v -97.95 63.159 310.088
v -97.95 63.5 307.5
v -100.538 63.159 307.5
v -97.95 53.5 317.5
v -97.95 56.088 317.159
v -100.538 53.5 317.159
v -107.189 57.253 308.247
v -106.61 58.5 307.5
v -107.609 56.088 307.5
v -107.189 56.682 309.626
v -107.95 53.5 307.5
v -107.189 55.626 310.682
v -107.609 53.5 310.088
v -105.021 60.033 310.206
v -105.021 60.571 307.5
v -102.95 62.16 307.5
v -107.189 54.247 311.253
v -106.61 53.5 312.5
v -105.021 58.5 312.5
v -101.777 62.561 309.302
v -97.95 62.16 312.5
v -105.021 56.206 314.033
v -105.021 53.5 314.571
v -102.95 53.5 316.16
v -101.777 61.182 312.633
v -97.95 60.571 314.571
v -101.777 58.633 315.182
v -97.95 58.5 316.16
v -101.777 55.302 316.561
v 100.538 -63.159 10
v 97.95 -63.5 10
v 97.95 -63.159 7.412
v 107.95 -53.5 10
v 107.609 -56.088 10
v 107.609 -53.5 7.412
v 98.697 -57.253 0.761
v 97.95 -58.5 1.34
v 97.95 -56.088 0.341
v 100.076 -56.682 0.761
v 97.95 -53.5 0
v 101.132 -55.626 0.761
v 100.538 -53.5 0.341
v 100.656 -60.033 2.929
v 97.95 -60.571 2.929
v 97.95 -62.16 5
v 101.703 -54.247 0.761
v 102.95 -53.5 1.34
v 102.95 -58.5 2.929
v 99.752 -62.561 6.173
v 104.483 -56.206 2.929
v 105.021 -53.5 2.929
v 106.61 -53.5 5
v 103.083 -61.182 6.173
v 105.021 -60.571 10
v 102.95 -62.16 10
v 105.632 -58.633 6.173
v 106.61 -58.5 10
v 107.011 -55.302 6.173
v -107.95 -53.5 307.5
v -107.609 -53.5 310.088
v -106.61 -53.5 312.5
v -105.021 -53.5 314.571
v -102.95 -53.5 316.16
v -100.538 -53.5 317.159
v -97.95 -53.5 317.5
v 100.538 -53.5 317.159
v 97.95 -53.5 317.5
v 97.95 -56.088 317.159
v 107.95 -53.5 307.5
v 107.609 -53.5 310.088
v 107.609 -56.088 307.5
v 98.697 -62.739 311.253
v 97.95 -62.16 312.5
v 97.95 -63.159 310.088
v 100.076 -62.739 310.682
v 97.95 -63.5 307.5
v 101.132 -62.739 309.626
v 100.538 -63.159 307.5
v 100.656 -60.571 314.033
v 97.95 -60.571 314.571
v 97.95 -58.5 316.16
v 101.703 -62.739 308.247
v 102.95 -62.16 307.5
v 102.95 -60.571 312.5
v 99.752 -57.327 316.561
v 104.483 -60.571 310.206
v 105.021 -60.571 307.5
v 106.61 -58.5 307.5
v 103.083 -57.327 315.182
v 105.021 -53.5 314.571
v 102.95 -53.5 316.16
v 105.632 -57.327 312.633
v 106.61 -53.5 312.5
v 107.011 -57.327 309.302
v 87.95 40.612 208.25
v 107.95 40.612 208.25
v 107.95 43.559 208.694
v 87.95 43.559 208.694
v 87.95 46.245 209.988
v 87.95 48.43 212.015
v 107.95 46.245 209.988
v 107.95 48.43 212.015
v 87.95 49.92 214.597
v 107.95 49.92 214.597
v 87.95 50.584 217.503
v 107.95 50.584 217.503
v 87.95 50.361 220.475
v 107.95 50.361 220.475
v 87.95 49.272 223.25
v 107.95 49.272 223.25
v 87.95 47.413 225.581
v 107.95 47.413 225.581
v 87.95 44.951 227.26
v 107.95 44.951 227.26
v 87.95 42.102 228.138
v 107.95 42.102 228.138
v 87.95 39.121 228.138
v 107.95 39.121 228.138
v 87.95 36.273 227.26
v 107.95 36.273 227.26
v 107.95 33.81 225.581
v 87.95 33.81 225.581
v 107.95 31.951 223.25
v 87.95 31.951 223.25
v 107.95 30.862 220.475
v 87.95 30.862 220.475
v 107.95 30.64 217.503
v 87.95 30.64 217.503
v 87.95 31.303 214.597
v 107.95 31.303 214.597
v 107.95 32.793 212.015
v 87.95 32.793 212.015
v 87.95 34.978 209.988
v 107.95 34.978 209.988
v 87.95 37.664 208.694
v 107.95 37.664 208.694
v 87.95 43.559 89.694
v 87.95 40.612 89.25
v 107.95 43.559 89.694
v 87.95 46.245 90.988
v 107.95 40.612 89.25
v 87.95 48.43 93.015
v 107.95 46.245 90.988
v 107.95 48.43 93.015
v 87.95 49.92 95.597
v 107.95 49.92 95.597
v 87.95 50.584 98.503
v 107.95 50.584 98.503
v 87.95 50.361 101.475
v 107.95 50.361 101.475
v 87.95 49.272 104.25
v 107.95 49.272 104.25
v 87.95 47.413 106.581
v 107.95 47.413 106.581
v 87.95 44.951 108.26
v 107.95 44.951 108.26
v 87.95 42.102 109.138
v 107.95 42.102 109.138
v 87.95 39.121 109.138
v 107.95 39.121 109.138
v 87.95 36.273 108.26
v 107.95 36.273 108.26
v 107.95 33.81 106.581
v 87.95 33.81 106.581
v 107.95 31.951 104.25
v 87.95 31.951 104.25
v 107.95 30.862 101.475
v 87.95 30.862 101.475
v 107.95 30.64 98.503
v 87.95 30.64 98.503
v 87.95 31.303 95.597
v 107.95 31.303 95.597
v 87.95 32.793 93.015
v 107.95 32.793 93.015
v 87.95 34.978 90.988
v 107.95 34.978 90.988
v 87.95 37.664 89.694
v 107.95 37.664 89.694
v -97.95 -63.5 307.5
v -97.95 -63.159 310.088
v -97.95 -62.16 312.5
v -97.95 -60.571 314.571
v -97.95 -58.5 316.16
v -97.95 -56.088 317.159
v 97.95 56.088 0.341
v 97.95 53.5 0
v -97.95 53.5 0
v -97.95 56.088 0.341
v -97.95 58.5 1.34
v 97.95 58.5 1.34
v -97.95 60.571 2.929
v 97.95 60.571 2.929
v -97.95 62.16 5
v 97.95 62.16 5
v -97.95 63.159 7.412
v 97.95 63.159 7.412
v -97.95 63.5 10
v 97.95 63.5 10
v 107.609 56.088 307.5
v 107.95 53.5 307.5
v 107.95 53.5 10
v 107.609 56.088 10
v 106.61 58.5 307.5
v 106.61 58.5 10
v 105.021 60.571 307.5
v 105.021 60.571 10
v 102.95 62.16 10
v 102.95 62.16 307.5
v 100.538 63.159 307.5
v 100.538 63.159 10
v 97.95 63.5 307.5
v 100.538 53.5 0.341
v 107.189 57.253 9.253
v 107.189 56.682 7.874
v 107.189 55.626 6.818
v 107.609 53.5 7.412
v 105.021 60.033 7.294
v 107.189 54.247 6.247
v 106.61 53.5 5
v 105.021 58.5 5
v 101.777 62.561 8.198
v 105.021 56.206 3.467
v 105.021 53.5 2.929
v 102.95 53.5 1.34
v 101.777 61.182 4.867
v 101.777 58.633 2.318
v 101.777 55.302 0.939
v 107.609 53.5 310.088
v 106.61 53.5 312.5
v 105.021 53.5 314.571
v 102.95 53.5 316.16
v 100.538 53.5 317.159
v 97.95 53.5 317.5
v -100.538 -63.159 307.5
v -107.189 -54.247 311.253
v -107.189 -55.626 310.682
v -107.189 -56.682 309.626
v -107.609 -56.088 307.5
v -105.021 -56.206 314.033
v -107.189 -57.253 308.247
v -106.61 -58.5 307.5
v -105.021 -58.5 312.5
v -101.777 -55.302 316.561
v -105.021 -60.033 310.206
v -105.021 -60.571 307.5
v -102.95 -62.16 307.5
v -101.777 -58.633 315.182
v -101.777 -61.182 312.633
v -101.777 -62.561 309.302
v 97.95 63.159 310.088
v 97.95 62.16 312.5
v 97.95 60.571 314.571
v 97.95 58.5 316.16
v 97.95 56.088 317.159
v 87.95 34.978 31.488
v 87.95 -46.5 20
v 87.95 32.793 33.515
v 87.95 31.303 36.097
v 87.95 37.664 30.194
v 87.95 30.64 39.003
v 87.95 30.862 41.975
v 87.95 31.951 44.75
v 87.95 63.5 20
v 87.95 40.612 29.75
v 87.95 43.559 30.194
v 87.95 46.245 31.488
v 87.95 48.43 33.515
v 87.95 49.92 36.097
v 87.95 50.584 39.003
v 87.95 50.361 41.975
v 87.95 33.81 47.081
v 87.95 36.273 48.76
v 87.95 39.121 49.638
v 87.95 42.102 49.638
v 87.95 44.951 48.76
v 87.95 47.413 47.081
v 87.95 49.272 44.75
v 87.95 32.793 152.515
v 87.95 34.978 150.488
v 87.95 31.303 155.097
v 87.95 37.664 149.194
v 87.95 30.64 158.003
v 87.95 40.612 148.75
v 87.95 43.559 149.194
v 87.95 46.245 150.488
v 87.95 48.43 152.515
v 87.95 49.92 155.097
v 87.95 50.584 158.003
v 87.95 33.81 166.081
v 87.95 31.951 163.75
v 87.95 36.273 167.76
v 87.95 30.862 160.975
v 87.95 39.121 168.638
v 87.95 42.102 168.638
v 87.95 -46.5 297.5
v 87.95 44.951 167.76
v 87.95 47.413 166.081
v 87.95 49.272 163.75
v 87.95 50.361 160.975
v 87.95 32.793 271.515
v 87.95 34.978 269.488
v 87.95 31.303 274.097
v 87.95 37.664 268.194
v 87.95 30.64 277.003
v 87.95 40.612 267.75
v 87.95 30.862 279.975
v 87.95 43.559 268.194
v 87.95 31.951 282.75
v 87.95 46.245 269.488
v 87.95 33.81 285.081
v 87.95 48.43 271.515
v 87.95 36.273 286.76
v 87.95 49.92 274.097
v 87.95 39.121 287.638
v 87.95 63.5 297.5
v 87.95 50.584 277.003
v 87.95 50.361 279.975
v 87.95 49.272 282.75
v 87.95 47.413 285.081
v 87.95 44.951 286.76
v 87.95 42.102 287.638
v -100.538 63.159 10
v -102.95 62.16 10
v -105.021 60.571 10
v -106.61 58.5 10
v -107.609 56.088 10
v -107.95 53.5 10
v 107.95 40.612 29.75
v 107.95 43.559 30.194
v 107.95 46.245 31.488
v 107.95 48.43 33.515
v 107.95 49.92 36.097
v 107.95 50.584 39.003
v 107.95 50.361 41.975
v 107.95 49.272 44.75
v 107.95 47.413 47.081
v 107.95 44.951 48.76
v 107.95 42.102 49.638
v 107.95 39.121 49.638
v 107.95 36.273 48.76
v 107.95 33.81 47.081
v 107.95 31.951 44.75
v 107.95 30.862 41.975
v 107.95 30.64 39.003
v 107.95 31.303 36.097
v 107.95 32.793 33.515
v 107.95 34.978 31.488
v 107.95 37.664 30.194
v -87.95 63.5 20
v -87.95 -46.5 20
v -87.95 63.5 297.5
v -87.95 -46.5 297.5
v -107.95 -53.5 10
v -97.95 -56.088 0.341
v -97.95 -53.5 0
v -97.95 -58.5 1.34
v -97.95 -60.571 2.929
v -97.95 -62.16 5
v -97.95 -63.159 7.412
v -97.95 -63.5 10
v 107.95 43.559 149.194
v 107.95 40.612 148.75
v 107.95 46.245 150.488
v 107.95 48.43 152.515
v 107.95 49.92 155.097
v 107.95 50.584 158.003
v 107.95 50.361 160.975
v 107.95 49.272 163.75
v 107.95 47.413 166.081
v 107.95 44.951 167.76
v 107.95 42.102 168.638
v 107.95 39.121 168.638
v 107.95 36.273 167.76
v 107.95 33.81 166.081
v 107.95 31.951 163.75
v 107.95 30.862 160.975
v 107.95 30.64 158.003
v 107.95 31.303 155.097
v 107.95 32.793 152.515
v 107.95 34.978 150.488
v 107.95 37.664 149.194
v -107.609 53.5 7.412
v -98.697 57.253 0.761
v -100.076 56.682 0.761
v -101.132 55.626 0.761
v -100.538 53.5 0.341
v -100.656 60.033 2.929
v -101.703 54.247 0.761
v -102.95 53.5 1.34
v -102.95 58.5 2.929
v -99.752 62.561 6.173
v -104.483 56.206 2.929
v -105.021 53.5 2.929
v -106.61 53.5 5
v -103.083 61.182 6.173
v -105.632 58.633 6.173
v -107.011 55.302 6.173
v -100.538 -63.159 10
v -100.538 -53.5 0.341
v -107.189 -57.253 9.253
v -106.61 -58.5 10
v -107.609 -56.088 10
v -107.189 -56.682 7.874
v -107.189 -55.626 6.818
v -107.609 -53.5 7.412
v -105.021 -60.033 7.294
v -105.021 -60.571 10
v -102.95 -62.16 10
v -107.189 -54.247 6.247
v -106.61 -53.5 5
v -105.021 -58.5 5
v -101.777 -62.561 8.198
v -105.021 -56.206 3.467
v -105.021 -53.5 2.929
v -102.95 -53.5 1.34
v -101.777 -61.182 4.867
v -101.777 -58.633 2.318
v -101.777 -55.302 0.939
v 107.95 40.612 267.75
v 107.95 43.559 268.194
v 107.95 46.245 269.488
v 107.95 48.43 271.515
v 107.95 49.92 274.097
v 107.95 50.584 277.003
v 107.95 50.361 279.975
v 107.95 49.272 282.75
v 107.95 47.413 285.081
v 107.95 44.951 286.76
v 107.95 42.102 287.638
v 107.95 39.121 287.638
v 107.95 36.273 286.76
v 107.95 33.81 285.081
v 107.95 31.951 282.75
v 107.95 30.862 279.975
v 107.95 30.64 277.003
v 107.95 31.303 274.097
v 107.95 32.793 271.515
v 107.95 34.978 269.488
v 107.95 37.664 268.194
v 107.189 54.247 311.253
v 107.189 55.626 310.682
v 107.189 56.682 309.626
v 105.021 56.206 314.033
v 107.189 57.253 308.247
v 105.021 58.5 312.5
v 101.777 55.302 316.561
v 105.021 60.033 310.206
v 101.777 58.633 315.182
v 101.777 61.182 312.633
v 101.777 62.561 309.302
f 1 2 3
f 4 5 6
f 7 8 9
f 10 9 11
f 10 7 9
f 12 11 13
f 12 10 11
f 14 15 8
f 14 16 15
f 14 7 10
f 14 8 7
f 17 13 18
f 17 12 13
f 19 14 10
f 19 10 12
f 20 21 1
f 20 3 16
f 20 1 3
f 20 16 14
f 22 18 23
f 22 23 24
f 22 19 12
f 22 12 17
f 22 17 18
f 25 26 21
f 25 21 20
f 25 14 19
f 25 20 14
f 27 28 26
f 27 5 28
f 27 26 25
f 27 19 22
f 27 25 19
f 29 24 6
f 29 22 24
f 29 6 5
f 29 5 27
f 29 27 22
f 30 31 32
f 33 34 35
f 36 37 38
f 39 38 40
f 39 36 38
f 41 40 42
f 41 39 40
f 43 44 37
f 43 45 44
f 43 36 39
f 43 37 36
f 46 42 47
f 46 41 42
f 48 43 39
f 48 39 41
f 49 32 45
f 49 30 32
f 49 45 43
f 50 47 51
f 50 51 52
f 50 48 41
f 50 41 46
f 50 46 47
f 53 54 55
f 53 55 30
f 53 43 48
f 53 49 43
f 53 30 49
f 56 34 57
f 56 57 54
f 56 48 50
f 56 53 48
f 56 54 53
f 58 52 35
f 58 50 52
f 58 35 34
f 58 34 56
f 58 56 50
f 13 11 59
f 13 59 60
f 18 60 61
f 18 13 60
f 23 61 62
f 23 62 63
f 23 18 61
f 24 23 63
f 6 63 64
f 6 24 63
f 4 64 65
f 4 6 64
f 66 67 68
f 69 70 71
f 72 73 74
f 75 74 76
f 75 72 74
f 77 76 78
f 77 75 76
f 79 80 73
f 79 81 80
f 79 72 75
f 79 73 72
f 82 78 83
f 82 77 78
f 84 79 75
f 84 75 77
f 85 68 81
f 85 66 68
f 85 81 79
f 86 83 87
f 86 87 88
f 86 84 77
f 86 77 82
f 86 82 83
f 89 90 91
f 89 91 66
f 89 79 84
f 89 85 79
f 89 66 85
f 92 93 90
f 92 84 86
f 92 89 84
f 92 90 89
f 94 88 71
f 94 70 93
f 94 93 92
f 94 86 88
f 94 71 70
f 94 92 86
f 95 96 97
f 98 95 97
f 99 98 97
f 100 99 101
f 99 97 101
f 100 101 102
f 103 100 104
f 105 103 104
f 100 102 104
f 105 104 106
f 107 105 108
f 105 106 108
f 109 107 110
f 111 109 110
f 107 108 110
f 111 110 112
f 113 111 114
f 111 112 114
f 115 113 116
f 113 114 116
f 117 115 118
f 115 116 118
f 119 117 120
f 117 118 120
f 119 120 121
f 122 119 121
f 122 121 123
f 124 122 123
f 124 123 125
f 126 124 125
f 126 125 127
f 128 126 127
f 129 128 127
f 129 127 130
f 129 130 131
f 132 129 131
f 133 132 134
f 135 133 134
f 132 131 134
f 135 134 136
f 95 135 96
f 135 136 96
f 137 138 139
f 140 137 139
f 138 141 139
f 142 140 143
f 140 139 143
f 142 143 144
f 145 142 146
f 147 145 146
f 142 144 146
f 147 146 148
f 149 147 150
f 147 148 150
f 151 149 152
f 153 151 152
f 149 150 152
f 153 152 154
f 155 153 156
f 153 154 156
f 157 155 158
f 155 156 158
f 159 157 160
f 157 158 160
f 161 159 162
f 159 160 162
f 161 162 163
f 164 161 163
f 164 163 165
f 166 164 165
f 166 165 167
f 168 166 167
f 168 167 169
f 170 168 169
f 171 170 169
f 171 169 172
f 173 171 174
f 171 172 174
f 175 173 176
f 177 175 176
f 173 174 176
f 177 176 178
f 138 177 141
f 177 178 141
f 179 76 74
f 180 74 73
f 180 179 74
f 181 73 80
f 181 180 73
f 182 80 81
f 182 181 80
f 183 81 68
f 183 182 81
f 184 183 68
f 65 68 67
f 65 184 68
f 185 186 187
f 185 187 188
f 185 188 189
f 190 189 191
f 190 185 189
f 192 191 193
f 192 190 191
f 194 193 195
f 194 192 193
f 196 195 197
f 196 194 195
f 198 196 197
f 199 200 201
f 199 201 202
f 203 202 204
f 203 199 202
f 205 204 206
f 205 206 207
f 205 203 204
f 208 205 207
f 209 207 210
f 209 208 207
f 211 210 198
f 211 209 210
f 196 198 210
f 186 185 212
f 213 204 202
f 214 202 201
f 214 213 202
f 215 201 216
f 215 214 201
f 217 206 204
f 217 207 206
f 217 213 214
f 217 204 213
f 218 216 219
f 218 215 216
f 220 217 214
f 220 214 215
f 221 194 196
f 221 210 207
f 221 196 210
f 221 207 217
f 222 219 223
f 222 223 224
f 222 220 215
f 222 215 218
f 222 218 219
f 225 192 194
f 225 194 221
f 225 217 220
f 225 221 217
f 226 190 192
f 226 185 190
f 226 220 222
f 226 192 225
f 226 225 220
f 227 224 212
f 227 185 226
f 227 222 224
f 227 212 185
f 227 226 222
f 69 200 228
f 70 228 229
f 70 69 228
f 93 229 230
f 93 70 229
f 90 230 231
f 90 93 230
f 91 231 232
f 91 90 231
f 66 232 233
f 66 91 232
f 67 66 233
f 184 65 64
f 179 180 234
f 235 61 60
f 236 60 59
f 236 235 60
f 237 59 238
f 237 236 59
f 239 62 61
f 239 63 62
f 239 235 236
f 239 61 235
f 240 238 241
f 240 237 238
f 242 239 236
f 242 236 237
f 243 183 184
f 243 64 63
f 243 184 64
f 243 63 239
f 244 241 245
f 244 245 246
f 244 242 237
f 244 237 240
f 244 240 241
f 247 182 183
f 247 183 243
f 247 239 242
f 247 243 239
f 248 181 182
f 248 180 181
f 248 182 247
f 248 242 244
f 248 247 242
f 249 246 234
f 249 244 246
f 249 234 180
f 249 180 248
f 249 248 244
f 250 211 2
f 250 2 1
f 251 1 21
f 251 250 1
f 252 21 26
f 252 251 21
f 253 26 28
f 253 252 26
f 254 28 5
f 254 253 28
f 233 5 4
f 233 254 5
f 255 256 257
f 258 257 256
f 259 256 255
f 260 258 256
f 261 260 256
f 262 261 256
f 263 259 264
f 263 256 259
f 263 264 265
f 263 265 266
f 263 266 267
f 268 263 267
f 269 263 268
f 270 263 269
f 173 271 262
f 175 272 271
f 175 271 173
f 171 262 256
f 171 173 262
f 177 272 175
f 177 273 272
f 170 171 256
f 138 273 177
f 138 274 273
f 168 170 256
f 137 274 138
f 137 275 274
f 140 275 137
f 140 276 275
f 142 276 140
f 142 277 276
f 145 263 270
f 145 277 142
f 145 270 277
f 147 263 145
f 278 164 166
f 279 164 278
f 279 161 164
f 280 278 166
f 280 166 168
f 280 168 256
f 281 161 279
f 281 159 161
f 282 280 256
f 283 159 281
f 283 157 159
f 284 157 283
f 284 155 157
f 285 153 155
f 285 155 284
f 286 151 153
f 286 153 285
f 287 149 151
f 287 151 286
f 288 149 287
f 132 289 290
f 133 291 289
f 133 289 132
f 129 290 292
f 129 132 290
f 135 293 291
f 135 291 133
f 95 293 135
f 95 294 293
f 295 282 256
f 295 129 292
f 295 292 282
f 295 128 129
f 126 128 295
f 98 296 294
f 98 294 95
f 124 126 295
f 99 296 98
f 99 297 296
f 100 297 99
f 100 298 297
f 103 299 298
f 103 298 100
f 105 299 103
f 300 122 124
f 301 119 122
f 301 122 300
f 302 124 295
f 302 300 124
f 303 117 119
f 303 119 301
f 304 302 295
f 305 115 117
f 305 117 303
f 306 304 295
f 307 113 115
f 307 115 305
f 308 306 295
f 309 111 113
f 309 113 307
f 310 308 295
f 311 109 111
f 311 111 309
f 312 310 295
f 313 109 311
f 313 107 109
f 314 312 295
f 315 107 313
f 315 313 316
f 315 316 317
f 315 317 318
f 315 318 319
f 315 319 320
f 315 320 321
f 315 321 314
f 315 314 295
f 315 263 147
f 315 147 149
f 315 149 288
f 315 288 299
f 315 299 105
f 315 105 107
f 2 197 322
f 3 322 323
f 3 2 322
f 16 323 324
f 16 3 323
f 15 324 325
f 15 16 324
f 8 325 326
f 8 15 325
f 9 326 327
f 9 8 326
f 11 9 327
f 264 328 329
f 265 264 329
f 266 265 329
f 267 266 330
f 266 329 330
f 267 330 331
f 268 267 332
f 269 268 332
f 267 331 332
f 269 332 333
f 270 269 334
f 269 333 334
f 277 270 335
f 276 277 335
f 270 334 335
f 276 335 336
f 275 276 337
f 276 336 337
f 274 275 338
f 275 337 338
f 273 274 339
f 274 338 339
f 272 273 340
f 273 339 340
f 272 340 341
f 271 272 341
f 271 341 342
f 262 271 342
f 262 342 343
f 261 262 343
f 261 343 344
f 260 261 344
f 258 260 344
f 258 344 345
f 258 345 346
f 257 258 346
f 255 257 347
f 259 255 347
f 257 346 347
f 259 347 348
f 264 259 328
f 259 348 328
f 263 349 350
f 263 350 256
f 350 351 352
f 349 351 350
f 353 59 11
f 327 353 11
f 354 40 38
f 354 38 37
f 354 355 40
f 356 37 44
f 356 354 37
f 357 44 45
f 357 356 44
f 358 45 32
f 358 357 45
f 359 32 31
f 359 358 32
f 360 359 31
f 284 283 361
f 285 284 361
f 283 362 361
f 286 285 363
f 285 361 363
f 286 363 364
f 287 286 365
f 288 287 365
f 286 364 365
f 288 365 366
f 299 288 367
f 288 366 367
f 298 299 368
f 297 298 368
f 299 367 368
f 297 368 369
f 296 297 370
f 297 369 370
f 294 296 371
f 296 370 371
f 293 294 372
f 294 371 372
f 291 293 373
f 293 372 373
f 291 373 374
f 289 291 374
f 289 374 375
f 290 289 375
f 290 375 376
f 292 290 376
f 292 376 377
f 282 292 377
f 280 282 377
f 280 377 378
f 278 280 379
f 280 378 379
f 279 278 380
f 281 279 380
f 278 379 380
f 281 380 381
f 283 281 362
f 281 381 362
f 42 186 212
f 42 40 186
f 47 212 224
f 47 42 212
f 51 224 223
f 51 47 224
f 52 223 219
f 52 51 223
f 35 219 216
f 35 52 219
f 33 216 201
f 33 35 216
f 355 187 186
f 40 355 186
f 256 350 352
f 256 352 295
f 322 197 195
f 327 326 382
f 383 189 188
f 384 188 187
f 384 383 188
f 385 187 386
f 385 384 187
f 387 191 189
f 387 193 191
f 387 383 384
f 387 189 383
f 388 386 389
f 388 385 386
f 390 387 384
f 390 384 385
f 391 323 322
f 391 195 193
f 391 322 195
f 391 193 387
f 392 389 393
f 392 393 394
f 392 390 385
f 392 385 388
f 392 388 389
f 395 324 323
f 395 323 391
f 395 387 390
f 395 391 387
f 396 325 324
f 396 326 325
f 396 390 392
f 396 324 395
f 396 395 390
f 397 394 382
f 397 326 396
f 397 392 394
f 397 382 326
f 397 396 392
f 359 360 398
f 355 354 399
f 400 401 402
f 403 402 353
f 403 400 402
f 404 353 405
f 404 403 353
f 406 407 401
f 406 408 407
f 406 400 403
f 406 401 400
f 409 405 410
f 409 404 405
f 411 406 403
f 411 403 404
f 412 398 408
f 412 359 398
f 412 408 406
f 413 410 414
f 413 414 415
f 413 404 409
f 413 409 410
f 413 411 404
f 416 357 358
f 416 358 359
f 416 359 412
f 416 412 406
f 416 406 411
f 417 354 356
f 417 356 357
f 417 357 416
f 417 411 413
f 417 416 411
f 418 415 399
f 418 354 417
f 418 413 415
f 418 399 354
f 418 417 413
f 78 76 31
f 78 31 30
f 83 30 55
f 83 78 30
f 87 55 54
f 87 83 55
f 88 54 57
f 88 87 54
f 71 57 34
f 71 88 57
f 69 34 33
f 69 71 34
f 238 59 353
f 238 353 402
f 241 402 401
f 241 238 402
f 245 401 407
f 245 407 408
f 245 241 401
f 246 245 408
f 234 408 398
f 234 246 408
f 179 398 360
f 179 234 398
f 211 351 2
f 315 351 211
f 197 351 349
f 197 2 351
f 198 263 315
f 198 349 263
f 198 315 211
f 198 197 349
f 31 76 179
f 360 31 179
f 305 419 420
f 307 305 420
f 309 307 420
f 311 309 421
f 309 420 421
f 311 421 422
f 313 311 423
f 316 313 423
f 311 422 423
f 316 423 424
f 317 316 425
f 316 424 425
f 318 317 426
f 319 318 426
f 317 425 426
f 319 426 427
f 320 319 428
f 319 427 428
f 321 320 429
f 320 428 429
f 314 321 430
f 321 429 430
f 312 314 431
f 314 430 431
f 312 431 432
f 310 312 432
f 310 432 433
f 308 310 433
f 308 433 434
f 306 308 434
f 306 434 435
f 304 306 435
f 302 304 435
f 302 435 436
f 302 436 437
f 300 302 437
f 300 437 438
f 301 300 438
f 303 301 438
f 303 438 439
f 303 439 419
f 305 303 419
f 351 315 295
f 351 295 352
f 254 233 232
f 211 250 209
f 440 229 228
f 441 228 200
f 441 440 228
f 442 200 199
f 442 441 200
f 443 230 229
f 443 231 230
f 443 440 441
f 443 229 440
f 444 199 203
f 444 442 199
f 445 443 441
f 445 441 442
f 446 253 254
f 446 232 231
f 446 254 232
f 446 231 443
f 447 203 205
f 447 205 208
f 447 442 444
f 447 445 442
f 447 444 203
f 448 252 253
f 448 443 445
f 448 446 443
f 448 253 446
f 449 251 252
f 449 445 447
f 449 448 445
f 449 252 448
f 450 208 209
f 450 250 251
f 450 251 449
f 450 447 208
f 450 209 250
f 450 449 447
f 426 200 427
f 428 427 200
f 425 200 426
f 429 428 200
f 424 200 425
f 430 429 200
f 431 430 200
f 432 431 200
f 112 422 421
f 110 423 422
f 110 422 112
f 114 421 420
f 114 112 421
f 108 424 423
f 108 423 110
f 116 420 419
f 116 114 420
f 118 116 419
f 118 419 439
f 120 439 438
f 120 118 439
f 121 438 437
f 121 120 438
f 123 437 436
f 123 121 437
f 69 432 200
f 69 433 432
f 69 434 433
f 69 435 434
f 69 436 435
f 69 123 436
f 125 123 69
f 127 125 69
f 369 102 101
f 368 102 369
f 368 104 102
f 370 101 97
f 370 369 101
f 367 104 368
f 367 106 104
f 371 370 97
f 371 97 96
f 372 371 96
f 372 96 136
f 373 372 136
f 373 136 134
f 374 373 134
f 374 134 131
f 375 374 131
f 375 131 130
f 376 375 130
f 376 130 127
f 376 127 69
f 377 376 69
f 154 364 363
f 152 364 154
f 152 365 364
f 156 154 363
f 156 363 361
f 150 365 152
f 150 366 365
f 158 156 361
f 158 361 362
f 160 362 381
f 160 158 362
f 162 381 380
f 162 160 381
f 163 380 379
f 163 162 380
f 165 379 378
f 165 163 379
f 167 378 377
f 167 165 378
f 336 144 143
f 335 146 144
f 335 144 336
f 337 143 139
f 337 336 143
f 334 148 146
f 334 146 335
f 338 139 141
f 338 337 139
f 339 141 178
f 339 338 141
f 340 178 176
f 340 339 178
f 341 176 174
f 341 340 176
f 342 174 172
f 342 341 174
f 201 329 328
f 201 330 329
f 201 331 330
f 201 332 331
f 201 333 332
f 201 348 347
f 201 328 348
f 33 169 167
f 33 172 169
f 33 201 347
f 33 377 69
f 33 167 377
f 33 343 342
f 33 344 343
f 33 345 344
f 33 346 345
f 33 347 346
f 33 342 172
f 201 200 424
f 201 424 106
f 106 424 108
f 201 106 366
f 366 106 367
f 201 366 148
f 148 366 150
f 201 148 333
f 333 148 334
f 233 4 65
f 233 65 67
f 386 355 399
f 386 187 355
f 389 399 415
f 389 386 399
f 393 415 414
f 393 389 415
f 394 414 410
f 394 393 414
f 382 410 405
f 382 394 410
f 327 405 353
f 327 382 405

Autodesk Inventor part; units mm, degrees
ref_plane "YZ Plane" through (0, 0, 0) normal (1, 0, 0) x (0, 1, 0)
ref_plane "XZ Plane" through (0, 0, 0) normal (0, 1, 0) x (-1, 0, 0)
ref_plane "XY Plane" through (0, 0, 0) normal (0, 0, 1) x (1, 0, 0)
sketch "Sketch1" plane through (0, 0, 0) normal (0, 0, 1) x (1, 0, 0)
  line L0 (-107.95, 63.5) -> (107.95, 63.5)
  line L1 (107.95, 63.5) -> (107.95, -63.5)
  line L2 (107.95, -63.5) -> (-107.95, -63.5)
  line L3 (-107.95, -63.5) -> (-107.95, 63.5)
  line L4 (-107.95, 63.5) -> (107.95, -63.5) construction
  line L5 (107.95, 63.5) -> (-107.95, -63.5) construction
  point P0 (0, 0)
  dimension "d0" = 215.9
  dimension "d1" = 127
extrude "Extrusion1" add sketch "Sketch1" along normal blind 317.5
fillet "Fillet1" radius 10 12 edges at (0, 63.5, 317.5) (-107.95, 63.5, 158.75) (0, 63.5, 0) (107.95, 63.5, 158.75) (107.95, 0, 317.5) (107.95, -63.5, 158.75) (107.95, 0, 0) (0, -63.5, 317.5) (-107.95, 0, 317.5) (0, -63.5, 0) (-107.95, 0, 0) (-107.95, -63.5, 158.75)
sketch "Sketch4" plane through (-97.95, 63.5, 10) normal (0, 1, 0) x (1, 0, 0)
  line L0 (10, -10) -> (185.9, -10)
  line L1 (185.9, -10) -> (185.9, -287.5)
  line L2 (185.9, -287.5) -> (10, -287.5)
  line L3 (10, -287.5) -> (10, -10)
  line L4 (0, 0) -> (195.9, 0) projected
  line L5 (195.9, 0) -> (195.9, -297.5) projected
  line L6 (195.9, -297.5) -> (0, -297.5) projected
  line L7 (0, -297.5) -> (0, 0) projected
  point P0 (97.95, 10)
  point P1 (97.95, -10)
  dimension "d20" = 10
  dimension "d21" = 10
  dimension "d22" = 10
  dimension "d23" = 10
extrude "Extrusion4" cut sketch "Sketch4" against normal blind 110 contours L0 L1 L2 L3
sketch "Sketch5" plane through (107.95, -53.5, 10) normal (1, 0, 0) x (0, 0, -1)
  circle A0 centre (-267.75, 94.1117) radius 10
  circle A1 centre (-208.25, 94.1117) radius 10
  circle A2 centre (-148.75, 94.1117) radius 10
  circle A3 centre (-89.25, 94.1117) radius 10
  circle A4 centre (-29.75, 94.1117) radius 10
  line L0 (-297.5, 107) -> (-297.5, 0) projected
  point P0 (10, 53.5)
  dimension "d26" = 20
  dimension "d27" = 20
  dimension "d28" = 20
  dimension "d29" = 20
  dimension "d30" = 20
  dimension "d31" = 29.75
  dimension "d32" = 59.5
  dimension "d33" = 59.5
  dimension "d34" = 59.5
  dimension "d35" = 59.5
extrude "Extrusion5" cut sketch "Sketch5" against normal blind 59.5
equation "\"d36\" = d33"
